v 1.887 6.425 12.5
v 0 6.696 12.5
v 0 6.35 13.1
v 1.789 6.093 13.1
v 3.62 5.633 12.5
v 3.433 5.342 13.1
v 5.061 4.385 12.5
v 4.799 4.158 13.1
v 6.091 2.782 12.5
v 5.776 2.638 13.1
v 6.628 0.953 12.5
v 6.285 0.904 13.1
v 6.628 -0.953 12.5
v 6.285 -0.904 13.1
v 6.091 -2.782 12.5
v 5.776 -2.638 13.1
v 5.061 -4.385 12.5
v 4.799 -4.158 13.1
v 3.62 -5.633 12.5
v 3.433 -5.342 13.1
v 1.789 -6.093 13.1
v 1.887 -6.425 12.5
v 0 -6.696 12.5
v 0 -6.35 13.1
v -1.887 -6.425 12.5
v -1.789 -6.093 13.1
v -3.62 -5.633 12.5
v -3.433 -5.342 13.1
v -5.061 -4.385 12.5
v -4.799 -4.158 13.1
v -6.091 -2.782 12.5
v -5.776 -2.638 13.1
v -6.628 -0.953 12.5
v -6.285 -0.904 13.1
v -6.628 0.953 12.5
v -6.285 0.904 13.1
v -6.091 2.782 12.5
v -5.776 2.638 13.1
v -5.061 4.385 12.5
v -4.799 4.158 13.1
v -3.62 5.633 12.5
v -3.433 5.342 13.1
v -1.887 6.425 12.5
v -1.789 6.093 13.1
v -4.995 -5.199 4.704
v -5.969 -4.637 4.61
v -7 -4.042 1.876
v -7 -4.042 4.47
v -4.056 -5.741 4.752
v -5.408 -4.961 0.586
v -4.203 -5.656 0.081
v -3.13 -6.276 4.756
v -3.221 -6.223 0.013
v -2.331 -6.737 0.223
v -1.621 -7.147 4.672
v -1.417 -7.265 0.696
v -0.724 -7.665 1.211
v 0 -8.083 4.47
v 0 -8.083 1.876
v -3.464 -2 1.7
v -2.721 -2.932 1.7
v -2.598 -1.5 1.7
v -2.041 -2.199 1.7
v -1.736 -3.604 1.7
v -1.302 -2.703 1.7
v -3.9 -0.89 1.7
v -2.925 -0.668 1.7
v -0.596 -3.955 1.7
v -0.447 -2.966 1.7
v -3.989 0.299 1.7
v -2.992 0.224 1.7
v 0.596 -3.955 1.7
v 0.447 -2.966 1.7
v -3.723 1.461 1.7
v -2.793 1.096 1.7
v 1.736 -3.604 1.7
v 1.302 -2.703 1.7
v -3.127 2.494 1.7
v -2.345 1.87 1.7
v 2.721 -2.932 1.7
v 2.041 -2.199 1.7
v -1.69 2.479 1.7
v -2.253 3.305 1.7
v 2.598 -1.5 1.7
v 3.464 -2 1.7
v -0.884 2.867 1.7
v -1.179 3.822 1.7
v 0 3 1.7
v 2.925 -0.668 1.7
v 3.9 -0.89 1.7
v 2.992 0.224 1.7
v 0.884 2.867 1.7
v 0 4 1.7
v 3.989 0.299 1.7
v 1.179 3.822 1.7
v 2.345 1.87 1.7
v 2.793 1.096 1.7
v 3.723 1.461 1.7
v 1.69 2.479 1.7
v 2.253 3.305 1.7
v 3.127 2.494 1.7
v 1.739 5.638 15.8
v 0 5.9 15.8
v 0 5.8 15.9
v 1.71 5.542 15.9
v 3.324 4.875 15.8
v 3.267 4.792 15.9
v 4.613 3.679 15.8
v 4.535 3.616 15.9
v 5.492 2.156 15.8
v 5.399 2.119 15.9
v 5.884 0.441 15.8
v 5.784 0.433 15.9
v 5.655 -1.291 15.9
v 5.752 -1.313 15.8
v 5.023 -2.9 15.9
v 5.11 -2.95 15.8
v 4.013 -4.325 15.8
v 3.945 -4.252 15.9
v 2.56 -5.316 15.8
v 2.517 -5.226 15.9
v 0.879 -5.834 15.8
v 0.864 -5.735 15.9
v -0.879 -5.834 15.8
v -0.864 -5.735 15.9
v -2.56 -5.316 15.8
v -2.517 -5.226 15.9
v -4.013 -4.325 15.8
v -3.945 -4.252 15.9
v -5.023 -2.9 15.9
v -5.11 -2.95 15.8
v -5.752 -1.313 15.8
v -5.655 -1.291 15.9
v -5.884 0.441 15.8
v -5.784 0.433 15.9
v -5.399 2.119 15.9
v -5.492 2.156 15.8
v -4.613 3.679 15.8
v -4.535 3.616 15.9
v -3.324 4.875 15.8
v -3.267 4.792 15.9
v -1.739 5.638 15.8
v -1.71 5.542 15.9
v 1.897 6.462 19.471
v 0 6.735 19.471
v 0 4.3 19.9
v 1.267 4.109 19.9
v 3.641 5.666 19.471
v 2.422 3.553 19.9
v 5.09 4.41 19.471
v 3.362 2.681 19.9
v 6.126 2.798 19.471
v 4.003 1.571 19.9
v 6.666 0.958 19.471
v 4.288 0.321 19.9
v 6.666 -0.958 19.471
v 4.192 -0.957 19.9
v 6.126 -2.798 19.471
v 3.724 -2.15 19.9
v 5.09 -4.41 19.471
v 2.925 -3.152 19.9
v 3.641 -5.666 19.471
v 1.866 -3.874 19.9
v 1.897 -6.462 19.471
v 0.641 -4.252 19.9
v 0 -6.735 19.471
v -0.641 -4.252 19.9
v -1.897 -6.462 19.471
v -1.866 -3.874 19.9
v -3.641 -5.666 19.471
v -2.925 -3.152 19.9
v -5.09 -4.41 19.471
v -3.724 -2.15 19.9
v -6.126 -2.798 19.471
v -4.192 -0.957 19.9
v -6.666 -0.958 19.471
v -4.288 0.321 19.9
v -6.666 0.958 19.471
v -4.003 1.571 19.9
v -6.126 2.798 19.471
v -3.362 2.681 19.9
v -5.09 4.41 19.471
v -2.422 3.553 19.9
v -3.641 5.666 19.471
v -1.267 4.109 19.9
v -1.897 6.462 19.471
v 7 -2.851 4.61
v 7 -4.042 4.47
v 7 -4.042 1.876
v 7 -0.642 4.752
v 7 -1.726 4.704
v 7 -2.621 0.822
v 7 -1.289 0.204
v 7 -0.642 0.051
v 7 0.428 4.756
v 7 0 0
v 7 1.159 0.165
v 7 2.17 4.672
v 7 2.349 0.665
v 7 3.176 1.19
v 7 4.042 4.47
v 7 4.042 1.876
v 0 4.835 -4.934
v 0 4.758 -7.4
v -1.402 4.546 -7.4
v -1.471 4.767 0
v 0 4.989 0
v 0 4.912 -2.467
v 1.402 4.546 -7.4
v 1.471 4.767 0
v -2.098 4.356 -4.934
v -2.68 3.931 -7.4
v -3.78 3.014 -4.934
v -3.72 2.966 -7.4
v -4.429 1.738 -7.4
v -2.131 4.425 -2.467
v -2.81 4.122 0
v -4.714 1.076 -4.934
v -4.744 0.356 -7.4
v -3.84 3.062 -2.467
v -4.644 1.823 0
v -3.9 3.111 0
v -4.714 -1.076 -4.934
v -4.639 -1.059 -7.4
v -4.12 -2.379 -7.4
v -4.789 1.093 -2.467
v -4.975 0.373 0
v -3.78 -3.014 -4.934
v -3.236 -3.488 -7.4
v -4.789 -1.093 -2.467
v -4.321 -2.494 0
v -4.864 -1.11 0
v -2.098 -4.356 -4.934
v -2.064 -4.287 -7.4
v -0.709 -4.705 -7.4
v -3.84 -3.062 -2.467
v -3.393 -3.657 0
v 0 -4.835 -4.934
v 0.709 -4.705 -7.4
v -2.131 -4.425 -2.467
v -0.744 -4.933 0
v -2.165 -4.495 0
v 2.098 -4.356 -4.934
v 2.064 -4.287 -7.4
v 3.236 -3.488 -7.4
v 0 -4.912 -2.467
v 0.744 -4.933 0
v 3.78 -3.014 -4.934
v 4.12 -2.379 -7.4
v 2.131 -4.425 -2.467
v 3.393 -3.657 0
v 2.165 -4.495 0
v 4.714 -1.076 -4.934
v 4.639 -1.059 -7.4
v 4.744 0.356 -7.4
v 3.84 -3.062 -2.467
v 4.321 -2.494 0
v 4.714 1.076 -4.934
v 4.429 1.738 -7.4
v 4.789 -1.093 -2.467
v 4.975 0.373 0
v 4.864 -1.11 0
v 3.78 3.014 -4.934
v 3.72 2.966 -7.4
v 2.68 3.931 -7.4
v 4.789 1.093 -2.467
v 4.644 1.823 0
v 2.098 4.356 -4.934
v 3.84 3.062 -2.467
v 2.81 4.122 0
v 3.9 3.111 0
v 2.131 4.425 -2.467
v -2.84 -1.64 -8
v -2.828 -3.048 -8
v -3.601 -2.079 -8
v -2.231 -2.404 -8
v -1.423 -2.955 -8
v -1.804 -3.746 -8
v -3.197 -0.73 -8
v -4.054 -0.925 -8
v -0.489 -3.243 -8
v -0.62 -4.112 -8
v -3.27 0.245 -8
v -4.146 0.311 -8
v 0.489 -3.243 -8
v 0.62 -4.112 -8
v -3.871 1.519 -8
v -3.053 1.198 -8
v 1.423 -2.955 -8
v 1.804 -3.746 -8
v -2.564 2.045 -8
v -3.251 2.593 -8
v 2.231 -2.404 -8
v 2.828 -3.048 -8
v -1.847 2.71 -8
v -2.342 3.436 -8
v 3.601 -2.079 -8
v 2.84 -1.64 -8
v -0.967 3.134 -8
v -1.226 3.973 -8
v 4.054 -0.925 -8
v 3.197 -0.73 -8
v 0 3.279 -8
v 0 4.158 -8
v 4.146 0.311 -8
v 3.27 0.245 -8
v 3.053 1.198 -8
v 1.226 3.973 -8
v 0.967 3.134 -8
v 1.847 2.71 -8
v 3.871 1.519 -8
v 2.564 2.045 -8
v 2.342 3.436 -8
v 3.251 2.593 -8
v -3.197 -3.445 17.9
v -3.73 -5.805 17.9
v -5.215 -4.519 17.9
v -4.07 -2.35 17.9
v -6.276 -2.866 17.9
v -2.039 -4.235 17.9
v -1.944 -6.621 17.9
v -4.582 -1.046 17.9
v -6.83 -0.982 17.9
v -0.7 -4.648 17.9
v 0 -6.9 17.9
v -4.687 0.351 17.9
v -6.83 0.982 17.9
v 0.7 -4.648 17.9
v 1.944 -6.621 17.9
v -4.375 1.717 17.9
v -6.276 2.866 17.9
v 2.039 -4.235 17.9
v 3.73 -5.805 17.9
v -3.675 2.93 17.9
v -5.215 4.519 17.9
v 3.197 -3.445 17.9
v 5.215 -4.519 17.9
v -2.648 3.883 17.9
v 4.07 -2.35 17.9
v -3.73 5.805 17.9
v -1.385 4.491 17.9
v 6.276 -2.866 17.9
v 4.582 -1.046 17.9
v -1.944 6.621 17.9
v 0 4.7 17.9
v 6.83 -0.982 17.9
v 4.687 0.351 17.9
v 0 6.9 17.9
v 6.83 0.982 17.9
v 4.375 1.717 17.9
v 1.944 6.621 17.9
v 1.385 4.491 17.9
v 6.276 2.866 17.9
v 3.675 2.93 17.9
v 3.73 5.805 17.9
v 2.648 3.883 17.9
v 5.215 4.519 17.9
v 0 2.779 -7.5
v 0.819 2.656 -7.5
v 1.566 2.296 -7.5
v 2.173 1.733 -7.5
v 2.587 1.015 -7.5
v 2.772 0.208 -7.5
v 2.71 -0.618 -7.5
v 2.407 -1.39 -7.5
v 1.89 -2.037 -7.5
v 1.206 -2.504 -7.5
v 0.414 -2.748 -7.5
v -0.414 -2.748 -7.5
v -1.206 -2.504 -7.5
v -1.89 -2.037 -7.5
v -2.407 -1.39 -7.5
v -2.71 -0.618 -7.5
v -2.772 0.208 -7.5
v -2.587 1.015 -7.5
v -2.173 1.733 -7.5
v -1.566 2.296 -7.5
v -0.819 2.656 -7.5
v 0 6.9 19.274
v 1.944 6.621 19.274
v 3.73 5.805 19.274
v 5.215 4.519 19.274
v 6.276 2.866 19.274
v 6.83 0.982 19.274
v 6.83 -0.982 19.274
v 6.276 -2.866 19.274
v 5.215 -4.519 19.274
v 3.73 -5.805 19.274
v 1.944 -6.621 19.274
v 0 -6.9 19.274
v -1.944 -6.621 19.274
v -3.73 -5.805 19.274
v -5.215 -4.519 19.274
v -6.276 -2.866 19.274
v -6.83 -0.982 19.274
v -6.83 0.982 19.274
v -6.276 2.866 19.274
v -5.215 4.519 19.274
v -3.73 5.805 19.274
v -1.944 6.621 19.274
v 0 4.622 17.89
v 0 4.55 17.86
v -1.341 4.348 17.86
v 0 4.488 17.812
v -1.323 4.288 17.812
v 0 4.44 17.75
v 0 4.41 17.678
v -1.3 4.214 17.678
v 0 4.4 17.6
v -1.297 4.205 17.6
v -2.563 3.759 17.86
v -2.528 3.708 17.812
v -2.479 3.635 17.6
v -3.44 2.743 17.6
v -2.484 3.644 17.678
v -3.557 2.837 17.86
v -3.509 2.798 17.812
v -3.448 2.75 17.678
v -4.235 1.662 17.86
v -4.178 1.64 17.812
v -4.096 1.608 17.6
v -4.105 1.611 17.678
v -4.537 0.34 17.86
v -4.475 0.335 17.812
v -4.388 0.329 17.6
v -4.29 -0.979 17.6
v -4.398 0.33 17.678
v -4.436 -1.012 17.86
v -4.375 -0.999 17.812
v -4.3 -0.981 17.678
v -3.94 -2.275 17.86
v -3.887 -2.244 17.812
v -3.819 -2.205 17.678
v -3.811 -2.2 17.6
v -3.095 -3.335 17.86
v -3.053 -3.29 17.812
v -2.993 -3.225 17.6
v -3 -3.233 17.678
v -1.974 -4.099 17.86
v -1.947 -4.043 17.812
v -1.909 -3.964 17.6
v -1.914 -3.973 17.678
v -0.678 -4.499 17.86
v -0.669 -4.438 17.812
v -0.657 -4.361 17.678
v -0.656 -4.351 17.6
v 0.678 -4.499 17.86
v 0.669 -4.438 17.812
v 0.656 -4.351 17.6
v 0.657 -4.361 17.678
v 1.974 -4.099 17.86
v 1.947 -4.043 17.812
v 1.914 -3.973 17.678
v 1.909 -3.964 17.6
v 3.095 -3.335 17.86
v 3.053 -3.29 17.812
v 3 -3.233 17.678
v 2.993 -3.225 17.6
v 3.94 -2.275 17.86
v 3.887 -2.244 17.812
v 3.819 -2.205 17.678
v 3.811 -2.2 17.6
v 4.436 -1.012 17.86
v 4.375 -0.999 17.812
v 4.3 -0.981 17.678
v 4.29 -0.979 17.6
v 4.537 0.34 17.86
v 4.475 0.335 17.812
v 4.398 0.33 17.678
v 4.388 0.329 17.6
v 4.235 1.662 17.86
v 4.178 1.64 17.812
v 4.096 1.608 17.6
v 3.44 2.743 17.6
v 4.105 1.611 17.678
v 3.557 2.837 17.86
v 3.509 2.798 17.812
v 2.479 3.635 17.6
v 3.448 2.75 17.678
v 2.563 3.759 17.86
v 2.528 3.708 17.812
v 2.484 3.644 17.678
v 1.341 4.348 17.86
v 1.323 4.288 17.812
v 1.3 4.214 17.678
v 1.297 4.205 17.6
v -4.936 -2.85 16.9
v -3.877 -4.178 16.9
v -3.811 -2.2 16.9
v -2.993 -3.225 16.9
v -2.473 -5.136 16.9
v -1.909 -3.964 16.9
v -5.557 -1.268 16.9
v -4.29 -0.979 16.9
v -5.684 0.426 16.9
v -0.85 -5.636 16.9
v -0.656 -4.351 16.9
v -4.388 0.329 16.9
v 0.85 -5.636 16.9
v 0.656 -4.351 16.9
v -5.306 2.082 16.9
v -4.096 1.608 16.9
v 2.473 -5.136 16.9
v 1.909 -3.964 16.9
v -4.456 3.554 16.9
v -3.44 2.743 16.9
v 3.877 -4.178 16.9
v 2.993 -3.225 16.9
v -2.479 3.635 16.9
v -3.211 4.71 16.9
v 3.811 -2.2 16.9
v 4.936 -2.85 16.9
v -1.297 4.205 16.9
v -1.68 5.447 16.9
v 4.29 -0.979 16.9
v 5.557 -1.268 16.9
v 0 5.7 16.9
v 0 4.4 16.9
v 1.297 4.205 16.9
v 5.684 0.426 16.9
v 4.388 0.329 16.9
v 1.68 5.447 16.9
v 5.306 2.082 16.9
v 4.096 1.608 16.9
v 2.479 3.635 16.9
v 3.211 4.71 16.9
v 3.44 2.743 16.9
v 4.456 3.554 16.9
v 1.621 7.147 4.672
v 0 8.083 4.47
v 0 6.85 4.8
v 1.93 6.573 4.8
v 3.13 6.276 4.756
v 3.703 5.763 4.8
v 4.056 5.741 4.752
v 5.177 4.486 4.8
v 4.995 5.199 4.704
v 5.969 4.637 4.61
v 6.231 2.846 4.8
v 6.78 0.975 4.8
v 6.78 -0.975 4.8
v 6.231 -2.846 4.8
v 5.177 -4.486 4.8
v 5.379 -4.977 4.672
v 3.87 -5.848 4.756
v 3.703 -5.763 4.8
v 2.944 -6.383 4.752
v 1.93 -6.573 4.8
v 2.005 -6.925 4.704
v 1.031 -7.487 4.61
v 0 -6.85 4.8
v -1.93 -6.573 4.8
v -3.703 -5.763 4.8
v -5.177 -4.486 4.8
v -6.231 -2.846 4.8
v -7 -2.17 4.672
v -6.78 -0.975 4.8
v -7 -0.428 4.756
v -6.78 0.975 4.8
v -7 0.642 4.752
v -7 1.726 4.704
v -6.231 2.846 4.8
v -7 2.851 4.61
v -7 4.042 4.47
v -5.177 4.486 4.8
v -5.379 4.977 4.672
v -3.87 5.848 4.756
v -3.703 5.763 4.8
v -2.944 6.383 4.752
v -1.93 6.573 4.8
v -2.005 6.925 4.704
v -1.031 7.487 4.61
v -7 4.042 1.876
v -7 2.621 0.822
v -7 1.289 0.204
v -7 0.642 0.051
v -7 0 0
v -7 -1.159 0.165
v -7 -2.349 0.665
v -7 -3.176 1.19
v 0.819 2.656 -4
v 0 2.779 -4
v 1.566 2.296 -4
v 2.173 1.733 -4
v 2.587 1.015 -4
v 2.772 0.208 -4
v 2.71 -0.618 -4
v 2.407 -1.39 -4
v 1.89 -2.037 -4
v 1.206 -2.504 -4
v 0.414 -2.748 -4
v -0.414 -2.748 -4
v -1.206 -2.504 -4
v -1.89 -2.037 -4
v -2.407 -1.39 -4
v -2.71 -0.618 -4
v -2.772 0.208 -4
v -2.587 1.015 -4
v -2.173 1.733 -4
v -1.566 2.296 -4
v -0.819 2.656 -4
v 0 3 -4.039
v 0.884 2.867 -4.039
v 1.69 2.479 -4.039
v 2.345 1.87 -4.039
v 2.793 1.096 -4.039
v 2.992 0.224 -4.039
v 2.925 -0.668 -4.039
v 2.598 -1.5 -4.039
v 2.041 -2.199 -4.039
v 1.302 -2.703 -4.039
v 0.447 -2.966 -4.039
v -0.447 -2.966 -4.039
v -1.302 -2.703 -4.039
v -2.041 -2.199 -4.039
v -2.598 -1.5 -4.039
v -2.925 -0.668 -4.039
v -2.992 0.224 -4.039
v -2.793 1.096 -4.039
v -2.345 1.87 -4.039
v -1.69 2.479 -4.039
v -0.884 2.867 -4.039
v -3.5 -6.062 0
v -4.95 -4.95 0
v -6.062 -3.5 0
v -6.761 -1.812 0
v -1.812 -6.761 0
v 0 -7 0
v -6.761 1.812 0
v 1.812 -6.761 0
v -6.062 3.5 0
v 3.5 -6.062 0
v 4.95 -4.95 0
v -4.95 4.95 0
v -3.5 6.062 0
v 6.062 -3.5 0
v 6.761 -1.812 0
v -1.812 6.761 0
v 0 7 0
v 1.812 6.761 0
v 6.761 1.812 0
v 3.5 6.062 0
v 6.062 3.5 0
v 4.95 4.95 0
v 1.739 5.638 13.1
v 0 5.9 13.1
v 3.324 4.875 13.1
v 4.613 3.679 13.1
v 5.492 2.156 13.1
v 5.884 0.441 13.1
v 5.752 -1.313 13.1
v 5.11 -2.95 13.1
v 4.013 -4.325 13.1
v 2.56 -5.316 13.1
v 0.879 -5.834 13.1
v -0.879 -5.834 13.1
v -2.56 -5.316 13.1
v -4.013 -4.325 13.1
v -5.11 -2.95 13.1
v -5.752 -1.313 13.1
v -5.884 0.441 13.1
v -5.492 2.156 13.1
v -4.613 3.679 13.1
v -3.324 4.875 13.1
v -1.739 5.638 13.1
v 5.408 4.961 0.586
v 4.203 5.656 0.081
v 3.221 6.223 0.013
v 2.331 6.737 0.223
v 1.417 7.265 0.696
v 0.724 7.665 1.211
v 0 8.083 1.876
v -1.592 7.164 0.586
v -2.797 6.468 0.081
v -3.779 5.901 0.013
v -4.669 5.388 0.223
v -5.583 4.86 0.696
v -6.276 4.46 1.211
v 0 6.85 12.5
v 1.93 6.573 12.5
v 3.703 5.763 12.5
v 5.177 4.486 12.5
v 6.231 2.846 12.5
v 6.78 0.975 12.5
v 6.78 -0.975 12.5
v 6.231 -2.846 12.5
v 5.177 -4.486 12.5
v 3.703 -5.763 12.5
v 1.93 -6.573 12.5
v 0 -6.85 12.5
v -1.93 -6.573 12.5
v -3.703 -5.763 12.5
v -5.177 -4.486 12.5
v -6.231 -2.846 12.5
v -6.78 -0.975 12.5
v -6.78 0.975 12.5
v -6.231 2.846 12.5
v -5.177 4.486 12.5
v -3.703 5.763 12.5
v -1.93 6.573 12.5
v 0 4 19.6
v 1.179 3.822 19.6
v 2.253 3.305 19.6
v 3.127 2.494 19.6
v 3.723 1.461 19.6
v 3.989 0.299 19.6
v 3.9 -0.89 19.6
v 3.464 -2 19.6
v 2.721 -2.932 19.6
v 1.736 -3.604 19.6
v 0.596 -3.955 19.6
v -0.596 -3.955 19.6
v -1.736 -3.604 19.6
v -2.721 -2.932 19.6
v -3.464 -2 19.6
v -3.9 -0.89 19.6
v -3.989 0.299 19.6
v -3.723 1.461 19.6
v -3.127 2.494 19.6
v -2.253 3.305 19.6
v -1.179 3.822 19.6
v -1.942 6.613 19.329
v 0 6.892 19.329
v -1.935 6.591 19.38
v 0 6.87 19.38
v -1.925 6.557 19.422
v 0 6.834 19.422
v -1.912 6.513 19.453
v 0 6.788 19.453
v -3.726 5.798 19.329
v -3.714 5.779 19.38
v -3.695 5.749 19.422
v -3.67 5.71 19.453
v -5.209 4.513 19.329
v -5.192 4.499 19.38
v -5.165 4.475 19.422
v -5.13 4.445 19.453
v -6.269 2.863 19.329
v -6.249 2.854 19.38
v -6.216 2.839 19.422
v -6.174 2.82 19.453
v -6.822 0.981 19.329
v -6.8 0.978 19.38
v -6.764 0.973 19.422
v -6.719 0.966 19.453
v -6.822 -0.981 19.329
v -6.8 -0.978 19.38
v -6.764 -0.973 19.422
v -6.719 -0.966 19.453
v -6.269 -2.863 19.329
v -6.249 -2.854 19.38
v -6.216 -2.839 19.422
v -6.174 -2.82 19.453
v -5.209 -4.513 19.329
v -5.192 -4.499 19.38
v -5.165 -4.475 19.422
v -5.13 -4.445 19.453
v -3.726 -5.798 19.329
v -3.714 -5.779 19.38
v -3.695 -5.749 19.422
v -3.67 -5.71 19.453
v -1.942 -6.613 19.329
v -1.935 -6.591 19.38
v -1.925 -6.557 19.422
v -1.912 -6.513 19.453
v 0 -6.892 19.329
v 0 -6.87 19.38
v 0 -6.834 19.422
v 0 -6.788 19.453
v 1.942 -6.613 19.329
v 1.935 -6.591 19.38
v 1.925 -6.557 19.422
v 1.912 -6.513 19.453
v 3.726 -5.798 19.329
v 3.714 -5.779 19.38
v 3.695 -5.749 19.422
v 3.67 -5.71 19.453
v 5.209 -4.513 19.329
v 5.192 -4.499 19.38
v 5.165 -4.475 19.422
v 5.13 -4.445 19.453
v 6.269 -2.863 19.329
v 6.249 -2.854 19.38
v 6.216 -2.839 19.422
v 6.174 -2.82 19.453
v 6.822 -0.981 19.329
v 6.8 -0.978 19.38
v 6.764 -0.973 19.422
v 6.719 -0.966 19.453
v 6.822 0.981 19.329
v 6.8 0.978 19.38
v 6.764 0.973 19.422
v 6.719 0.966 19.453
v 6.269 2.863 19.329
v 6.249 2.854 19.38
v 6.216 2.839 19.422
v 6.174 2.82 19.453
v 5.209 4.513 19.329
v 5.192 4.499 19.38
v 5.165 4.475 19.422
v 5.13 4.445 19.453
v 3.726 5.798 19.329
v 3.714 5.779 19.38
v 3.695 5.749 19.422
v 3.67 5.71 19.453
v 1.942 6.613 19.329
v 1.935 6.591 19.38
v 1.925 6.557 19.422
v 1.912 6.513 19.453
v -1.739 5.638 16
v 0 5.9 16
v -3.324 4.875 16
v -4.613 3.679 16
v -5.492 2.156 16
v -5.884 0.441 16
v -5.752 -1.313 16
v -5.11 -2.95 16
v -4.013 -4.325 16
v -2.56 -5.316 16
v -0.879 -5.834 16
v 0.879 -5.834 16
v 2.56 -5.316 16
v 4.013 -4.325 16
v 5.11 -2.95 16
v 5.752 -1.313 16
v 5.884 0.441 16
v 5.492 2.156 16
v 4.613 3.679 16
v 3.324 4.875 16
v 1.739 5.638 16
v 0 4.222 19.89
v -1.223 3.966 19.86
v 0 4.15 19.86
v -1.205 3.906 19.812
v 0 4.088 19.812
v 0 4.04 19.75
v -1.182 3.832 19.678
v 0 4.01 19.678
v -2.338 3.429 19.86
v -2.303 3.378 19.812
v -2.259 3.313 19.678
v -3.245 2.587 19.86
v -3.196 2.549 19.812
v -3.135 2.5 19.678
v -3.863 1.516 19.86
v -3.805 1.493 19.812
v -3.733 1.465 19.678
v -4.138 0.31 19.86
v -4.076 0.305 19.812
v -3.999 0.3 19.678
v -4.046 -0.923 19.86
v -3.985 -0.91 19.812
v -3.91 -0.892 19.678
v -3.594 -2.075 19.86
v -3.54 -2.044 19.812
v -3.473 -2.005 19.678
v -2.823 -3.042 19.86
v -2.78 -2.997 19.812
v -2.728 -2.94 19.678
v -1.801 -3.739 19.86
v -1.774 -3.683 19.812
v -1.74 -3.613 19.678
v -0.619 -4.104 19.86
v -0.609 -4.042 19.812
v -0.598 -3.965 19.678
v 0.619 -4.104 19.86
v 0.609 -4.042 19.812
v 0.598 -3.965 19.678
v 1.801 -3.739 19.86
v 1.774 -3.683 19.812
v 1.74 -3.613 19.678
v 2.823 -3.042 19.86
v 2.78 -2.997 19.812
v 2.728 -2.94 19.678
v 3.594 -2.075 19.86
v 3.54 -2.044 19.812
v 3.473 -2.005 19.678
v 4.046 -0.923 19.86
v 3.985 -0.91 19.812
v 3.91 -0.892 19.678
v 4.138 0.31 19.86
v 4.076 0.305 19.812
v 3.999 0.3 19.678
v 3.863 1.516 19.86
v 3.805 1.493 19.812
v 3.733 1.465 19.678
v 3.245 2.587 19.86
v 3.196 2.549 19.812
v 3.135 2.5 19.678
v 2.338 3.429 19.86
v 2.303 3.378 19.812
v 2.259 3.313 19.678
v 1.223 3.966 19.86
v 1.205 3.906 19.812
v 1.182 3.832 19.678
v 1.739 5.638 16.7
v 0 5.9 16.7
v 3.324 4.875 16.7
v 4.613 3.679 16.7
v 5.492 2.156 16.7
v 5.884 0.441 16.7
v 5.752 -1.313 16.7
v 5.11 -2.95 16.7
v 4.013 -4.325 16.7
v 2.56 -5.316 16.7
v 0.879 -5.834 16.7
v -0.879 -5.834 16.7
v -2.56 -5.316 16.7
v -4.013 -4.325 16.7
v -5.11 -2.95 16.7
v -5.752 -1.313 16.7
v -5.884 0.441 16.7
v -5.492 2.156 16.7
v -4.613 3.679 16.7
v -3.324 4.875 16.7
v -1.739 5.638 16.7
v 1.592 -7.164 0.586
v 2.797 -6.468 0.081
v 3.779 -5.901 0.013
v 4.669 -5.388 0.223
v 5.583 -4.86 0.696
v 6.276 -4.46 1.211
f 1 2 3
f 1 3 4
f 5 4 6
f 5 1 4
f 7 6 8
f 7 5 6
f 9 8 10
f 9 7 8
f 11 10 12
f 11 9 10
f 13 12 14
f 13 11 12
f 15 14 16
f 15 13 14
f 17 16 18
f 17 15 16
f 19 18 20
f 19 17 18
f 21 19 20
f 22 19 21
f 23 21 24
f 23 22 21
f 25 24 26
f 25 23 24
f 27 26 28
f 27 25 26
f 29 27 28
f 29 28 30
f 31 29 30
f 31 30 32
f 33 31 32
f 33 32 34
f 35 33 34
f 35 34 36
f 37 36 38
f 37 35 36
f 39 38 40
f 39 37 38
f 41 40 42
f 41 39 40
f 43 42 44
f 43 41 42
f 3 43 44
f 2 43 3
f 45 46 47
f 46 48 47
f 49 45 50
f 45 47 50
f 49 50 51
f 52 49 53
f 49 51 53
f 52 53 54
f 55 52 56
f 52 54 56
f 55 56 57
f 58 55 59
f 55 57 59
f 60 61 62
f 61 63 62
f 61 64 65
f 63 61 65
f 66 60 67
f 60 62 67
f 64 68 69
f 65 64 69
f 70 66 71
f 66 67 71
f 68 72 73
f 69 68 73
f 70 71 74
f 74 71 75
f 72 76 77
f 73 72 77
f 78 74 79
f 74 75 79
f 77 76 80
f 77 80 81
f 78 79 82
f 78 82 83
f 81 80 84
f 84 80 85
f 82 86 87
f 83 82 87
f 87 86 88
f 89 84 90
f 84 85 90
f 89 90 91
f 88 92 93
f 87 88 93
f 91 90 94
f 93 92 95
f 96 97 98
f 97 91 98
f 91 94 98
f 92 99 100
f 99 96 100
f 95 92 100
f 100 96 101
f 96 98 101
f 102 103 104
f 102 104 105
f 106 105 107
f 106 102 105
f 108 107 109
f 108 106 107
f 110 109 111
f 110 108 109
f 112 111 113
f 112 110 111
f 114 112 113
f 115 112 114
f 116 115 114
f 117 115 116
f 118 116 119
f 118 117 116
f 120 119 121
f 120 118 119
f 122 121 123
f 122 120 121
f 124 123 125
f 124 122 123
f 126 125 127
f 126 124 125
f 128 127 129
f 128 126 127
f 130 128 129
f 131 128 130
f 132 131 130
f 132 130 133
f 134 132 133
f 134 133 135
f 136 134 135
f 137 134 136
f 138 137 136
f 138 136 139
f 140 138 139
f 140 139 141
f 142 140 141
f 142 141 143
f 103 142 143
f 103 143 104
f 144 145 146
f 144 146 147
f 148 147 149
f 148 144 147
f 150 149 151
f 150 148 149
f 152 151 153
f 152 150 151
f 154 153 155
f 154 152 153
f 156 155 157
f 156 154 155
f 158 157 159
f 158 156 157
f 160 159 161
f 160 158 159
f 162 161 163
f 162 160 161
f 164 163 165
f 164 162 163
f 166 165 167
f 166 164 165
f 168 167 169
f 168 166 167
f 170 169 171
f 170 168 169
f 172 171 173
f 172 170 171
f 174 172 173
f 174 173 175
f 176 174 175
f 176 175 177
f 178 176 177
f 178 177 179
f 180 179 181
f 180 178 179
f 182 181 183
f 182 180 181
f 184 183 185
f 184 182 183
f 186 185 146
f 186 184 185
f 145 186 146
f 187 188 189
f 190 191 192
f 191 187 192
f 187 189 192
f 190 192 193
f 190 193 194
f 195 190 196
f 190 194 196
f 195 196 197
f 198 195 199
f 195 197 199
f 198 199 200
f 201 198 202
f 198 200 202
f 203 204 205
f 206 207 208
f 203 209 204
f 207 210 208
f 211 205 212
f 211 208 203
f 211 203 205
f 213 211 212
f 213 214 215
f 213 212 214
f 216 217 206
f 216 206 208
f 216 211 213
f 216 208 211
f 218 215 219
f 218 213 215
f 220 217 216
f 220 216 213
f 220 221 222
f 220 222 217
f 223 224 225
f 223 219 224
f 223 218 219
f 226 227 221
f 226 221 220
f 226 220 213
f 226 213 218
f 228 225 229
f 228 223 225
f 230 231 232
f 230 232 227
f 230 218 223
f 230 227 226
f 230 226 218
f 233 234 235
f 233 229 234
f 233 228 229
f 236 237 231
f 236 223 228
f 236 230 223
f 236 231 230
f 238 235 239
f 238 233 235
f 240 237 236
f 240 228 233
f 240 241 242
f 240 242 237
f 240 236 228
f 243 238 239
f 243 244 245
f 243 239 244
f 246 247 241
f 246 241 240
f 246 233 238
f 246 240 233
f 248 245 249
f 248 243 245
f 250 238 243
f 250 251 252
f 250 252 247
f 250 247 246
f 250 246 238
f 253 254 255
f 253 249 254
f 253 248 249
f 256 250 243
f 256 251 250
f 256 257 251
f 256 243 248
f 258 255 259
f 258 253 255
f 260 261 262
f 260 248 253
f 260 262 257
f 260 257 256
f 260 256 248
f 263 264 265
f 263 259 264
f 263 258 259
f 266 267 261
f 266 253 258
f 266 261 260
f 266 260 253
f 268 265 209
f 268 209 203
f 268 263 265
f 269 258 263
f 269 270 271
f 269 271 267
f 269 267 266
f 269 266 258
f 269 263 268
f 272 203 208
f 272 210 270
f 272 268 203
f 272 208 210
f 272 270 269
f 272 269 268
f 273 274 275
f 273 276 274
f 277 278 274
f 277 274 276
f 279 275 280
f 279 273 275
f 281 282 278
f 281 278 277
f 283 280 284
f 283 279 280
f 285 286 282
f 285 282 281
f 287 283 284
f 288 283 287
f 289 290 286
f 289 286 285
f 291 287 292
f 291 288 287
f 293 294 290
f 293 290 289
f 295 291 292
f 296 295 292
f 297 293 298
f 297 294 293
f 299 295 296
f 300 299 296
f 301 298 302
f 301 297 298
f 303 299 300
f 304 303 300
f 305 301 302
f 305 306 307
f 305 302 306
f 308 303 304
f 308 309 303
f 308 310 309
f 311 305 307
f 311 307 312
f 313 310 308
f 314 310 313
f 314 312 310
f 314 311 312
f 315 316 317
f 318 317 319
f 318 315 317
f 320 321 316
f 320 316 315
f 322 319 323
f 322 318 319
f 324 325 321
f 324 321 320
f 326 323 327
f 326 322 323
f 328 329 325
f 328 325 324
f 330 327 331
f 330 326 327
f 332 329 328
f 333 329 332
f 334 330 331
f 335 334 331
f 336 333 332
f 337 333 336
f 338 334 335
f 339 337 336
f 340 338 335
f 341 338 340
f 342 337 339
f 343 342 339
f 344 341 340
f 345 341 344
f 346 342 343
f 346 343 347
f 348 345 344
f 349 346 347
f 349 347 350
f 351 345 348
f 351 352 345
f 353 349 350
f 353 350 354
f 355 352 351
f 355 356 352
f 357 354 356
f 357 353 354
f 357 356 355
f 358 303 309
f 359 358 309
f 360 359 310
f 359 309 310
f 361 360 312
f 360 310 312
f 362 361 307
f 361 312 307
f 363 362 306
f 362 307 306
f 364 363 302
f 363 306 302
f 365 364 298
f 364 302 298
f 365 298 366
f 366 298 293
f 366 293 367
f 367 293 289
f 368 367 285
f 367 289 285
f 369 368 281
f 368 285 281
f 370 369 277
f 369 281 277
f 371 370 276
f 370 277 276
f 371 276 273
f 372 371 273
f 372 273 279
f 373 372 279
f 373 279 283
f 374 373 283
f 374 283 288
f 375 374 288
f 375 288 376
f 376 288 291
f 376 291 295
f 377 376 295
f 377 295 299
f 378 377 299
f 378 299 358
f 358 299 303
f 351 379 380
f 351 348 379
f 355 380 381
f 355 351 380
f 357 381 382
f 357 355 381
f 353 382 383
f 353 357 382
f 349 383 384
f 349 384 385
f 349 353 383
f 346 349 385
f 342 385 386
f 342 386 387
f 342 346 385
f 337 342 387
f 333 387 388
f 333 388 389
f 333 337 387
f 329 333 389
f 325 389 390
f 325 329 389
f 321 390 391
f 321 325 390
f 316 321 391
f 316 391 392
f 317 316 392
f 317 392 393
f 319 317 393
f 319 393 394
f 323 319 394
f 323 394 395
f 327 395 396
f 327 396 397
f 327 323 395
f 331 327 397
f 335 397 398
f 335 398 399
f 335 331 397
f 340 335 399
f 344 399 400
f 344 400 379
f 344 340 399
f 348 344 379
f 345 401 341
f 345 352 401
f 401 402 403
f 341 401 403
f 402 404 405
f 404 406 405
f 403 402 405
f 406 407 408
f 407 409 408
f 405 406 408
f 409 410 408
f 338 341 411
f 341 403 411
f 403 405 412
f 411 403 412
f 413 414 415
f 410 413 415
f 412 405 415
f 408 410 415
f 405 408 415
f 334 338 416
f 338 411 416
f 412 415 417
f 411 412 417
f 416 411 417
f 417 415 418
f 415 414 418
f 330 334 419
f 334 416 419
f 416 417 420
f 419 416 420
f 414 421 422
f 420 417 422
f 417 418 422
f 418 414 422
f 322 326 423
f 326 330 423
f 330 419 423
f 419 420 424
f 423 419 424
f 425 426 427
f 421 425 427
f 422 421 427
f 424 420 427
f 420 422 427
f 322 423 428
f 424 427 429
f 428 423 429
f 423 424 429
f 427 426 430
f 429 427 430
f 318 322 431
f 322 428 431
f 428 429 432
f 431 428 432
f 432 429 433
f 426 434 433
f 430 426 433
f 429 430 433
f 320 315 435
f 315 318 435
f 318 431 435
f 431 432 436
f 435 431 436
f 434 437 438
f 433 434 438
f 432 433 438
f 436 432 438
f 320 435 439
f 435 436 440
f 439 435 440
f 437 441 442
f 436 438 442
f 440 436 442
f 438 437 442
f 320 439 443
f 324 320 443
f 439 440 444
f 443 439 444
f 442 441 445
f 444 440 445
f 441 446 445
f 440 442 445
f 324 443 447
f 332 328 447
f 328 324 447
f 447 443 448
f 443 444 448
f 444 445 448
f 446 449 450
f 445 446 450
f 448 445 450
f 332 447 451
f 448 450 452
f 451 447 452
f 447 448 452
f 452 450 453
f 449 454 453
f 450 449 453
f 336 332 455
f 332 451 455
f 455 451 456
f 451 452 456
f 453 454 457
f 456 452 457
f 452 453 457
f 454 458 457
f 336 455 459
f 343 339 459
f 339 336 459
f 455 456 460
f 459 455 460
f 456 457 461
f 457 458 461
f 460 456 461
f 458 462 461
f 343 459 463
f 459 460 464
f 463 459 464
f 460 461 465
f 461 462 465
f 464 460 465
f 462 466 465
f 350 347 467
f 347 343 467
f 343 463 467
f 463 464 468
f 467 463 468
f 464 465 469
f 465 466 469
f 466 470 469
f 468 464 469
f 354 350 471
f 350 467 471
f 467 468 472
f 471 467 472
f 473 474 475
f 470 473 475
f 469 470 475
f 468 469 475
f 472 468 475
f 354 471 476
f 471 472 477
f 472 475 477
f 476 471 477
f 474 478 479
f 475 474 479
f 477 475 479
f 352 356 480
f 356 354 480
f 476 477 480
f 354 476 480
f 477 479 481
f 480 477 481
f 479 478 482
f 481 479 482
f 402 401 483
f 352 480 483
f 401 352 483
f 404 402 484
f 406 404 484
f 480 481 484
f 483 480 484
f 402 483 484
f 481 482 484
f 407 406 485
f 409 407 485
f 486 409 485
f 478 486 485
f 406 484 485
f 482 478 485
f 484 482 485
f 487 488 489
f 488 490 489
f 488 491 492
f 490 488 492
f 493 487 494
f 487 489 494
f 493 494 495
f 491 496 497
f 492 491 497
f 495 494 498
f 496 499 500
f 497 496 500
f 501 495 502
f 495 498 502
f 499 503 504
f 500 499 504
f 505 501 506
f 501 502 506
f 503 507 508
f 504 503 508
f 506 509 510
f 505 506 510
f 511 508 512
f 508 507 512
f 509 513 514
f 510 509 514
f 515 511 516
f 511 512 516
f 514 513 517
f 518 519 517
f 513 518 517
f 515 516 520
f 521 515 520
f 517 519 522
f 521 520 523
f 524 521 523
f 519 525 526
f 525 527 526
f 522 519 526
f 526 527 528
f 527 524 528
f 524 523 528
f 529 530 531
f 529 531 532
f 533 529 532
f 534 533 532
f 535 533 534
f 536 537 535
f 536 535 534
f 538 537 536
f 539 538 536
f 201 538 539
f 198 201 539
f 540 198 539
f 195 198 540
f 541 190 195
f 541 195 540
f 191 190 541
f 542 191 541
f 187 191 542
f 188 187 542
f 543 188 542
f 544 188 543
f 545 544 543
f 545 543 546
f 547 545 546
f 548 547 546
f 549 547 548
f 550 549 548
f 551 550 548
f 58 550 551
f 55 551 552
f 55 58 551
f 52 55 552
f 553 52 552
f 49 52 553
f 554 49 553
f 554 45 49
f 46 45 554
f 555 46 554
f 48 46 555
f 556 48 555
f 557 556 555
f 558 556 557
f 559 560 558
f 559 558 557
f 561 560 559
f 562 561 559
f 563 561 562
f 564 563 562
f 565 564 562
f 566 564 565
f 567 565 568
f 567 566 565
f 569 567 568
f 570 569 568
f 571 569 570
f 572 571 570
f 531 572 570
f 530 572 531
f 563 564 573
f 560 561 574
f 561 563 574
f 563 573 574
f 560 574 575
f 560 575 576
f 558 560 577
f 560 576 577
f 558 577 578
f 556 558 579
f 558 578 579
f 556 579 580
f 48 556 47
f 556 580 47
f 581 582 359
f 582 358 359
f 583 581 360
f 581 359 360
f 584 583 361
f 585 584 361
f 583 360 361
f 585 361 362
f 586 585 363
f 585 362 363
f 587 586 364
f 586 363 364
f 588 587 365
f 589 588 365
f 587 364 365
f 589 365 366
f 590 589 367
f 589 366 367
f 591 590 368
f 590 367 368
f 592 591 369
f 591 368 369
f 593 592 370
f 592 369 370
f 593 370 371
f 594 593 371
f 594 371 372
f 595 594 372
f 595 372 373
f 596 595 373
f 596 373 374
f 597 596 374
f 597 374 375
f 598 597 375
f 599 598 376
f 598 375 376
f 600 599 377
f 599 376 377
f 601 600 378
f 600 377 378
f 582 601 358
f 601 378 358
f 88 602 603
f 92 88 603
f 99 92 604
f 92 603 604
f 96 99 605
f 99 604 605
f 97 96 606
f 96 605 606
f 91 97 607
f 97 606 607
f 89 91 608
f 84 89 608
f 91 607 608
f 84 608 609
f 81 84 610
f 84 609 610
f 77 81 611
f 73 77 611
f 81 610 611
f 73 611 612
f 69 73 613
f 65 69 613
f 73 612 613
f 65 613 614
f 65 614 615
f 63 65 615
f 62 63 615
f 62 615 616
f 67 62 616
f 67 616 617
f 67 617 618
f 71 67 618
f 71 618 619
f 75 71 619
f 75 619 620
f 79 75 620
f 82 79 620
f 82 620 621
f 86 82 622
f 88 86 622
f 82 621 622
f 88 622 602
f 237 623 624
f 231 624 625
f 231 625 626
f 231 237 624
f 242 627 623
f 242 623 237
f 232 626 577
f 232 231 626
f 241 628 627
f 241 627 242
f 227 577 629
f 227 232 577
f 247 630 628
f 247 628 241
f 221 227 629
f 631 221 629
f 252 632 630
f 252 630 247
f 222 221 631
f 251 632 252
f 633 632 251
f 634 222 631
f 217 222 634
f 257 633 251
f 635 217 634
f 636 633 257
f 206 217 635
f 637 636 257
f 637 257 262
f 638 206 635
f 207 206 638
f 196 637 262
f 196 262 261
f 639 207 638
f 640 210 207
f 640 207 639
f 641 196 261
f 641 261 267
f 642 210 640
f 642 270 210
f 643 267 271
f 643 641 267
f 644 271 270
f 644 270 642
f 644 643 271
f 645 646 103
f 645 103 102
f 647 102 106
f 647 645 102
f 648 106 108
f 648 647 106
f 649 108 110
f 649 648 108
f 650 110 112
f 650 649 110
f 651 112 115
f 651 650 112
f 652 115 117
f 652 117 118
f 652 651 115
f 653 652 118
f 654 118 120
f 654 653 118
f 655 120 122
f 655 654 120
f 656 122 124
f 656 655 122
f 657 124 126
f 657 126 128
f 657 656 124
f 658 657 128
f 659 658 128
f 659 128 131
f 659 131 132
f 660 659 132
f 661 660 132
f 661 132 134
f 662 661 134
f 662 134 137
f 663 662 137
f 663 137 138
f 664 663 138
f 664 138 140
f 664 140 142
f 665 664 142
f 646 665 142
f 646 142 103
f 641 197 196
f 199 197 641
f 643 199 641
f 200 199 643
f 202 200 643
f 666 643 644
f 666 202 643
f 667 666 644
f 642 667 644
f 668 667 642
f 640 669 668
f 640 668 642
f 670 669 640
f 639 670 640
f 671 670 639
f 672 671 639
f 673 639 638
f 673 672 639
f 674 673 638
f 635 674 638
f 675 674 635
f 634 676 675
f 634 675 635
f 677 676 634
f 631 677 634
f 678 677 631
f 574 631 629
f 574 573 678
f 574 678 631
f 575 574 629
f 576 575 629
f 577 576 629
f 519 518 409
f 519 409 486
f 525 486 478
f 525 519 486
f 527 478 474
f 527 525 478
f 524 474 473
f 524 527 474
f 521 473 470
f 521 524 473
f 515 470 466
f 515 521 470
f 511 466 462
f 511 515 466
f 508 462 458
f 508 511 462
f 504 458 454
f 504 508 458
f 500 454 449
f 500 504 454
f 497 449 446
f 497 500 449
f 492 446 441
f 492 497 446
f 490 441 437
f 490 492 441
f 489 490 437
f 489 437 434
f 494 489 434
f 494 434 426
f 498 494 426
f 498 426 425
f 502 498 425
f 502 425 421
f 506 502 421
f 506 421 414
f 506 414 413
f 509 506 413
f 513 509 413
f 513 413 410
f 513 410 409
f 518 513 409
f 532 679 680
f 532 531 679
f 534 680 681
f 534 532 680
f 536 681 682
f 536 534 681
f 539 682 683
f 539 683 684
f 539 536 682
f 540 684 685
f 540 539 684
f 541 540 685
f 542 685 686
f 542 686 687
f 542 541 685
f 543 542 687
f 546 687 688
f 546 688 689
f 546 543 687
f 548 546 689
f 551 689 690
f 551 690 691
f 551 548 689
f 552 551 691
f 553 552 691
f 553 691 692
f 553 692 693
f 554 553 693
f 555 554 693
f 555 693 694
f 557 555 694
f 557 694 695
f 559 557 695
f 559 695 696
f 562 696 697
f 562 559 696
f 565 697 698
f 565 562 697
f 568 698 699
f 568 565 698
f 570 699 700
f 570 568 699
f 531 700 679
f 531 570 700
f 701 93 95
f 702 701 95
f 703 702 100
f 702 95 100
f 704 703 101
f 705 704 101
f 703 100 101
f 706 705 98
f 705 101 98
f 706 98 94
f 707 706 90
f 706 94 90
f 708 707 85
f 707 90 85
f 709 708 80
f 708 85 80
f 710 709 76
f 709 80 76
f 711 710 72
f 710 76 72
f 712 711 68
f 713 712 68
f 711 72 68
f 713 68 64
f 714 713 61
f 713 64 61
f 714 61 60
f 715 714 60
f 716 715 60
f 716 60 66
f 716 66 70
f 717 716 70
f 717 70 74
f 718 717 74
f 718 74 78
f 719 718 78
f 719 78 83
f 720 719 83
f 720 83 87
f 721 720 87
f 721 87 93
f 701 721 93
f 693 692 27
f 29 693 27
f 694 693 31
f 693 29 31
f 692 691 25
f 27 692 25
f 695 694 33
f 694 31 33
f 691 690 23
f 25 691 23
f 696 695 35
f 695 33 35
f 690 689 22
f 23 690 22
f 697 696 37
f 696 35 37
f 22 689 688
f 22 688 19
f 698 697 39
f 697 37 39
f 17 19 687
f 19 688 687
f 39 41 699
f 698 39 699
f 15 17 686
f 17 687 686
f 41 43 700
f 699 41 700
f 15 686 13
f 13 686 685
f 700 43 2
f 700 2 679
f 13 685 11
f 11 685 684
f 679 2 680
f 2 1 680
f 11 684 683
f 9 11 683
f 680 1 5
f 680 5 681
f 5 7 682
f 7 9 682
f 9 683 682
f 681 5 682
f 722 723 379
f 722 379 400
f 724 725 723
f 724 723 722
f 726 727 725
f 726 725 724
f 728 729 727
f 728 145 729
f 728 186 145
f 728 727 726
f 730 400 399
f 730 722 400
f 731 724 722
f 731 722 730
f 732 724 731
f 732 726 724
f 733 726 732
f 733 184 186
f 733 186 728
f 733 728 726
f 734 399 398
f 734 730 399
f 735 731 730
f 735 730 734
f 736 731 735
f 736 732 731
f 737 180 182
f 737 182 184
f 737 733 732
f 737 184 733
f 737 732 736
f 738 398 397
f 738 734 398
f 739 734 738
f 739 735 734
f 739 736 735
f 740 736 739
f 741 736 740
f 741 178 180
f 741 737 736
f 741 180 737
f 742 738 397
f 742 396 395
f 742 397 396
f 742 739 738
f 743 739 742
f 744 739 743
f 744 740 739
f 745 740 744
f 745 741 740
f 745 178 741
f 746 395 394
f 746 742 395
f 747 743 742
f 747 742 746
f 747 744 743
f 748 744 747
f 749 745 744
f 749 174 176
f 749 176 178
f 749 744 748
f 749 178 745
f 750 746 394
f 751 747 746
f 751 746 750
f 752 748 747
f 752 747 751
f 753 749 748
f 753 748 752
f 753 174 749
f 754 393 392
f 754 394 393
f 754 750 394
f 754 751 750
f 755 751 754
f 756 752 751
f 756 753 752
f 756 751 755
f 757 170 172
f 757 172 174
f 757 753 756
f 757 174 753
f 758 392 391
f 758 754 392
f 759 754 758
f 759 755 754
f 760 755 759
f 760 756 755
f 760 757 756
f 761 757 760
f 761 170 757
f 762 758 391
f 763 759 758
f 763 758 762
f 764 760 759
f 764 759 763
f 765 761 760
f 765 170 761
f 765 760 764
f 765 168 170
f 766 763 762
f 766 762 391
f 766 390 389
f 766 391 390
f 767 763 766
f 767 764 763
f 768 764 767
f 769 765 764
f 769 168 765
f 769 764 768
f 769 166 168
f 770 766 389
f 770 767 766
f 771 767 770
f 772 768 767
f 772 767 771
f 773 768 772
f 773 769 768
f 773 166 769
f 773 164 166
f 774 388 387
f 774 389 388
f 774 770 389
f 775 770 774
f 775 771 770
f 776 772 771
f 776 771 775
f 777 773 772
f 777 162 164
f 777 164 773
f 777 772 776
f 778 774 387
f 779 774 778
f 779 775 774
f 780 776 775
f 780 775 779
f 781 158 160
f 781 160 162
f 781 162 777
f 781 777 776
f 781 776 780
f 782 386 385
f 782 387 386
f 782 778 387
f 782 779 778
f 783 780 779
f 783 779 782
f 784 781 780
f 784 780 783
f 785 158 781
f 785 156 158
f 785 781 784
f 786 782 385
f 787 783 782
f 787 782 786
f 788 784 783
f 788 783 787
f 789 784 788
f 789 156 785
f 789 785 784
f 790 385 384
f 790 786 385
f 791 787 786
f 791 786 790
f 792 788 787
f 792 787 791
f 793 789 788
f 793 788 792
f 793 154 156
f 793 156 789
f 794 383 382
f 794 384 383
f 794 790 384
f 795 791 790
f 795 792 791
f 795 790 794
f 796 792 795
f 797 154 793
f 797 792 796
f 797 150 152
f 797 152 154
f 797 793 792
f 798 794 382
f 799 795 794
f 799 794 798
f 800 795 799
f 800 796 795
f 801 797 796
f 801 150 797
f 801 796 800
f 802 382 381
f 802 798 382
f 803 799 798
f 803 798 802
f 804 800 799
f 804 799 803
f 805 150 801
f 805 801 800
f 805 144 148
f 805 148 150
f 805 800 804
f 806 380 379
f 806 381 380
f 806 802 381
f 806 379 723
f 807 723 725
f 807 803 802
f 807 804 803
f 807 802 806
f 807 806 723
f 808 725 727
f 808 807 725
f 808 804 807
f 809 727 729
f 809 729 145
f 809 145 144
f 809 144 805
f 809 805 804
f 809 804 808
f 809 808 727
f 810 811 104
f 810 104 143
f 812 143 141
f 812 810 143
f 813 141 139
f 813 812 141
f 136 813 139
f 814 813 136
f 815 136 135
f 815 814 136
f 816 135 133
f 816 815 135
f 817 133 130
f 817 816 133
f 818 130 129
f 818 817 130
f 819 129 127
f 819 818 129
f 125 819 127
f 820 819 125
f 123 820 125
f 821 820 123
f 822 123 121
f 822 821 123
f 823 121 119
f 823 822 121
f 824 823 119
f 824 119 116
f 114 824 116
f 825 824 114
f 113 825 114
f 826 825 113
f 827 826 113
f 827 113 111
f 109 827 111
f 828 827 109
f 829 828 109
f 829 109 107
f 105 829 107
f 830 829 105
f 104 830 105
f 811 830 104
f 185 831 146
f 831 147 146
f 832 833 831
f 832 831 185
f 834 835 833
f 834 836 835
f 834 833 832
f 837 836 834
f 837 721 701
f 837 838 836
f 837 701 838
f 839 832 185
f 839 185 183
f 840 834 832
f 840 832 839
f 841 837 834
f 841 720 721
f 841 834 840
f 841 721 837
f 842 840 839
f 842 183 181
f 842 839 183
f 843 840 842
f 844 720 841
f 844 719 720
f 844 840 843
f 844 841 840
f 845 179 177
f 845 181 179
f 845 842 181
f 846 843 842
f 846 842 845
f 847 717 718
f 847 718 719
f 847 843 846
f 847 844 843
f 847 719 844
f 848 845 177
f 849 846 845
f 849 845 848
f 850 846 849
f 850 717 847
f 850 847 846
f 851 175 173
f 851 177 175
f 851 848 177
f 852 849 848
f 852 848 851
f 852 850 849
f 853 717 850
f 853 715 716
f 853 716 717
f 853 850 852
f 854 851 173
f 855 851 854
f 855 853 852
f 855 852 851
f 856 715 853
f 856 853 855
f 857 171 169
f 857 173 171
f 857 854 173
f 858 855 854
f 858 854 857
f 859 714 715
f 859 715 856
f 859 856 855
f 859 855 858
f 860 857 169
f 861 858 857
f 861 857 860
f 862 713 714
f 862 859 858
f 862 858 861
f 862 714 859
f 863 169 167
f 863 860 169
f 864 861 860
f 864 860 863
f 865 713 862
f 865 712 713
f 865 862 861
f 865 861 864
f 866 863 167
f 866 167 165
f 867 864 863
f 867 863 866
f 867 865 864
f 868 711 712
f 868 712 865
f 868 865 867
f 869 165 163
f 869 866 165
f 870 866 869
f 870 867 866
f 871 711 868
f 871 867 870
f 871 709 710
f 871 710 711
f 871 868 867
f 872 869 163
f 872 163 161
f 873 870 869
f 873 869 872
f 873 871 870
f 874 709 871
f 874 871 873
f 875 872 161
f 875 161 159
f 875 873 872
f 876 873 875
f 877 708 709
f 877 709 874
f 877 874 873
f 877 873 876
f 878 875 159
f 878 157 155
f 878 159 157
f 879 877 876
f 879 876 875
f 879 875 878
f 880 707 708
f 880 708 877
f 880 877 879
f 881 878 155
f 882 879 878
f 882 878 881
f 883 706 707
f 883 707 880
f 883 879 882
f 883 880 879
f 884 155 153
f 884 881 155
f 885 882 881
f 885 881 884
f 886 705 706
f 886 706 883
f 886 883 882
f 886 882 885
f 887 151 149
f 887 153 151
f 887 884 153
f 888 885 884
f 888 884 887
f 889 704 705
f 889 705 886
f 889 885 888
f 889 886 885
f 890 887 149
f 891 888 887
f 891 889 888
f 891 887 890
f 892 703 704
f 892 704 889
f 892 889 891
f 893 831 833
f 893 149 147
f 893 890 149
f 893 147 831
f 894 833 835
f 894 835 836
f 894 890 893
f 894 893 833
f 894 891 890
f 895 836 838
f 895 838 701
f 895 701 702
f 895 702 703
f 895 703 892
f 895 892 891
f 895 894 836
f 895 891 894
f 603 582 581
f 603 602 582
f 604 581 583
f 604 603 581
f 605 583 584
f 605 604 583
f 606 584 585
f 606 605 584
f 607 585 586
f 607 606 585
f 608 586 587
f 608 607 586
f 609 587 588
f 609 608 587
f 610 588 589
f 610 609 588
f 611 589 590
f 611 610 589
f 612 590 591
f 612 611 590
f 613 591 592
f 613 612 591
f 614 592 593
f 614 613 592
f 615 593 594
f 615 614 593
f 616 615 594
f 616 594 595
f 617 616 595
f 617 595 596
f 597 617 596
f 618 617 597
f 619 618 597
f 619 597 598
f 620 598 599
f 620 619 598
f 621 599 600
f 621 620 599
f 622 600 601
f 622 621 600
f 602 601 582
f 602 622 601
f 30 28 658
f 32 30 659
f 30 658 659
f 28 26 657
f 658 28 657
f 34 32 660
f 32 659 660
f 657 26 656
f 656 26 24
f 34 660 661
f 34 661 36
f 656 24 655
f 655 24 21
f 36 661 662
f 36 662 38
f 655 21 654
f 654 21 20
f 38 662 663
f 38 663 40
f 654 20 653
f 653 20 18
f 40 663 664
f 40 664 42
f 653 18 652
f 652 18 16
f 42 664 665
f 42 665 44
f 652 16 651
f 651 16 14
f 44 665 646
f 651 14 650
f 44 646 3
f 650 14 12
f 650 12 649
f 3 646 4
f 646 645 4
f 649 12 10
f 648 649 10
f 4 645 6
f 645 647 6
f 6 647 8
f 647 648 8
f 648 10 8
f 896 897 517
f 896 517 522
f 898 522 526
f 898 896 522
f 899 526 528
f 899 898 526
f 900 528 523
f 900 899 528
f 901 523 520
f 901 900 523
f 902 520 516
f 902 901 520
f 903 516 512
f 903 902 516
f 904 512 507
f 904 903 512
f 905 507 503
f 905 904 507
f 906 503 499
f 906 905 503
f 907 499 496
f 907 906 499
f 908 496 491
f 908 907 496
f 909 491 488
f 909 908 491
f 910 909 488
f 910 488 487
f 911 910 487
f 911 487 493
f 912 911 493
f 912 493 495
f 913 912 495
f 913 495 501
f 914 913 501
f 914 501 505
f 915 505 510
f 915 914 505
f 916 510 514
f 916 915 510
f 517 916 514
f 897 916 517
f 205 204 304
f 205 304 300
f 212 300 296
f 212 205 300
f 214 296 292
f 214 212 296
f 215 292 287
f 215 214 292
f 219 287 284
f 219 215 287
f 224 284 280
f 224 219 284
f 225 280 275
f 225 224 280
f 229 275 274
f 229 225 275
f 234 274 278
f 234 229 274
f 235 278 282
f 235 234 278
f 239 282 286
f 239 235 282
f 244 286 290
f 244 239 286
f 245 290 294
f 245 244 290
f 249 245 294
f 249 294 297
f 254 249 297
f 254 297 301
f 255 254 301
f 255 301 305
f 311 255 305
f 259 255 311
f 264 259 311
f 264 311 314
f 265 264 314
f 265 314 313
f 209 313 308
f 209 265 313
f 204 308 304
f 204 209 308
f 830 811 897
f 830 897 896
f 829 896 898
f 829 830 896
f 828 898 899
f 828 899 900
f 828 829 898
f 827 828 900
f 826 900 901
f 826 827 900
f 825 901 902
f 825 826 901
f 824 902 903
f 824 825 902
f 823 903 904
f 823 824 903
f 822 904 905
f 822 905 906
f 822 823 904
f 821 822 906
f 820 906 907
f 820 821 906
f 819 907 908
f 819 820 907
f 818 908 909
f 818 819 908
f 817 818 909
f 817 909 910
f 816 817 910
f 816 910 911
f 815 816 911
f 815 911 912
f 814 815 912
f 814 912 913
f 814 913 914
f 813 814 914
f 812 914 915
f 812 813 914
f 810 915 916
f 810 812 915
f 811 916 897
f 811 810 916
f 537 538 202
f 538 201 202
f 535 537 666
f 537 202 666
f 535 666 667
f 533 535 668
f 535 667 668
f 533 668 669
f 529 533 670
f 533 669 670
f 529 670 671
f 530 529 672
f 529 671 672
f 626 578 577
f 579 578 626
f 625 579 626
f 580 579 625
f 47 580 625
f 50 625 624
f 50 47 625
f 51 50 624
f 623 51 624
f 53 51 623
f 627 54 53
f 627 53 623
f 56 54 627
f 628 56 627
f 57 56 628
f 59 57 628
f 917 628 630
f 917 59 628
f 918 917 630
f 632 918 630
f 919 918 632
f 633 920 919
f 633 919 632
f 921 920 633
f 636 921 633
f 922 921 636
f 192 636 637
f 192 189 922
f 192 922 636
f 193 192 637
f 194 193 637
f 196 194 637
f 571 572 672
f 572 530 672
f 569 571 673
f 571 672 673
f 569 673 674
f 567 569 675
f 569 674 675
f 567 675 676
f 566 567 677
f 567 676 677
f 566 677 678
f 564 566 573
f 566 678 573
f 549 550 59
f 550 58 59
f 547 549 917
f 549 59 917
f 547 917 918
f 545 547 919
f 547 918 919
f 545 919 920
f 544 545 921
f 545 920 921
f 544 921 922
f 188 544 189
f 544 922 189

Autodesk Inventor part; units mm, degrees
sketch "Sketch_2" plane through (0, 0, 0) normal (1, 0, 0) x (0, 1, 0)
  line L0 (0, 0) -> (0, 19.9)
  line L1 (0, 19.9) -> (4.3, 19.9)
  line L2 (4.3, 19.9) -> (6.7347, 19.4707)
  arc A0 (6.9, 19.2737) -> (6.7347, 19.4707) centre (6.7, 19.2737) ccw
  line L3 (6.9, 19.2737) -> (6.9, 17.9)
  line L4 (6.9, 17.9) -> (4.7, 17.9)
  arc A1 (4.7, 17.9) -> (4.4, 17.6) centre (4.7, 17.6) ccw
  line L5 (4.4, 17.6) -> (4.4, 16.9)
  line L6 (4.4, 16.9) -> (5.7, 16.9)
  line L7 (5.7, 16.9) -> (5.9, 16.7)
  line L8 (5.9, 16.7) -> (5.9, 16)
  line L9 (5.9, 16) -> (5.8, 15.9)
  line L10 (5.8, 15.9) -> (5.9, 15.8)
  line L11 (5.9, 15.8) -> (5.9, 13.1)
  line L12 (5.9, 13.1) -> (8.4, 13.1)
  line L13 (8.4, 13.1) -> (8.4, 2.4249)
  line L14 (8.4, 2.4249) -> (7, 0)
  line L15 (7, 0) -> (0, 0)
  line L16 (0, 0) -> (0, 19.9)
revolve "Revolution1" add sketch "Sketch_2" angle 360 about axis through (0, 0, 0) along (0, 0, -1)
sketch "Sketch_3" plane through (0, 0, 0) normal (0, 0, 1) x (1, 0, 0)
  line L0 (-14, -14) -> (14, -14)
  line L1 (14, -14) -> (14, 14)
  line L2 (14, 14) -> (-14, 14)
  line L3 (-14, 14) -> (-14, -14)
  line L4 (-7, -4.0415) -> (0, -8.0829)
  line L5 (0, -8.0829) -> (7, -4.0415)
  line L6 (7, -4.0415) -> (7, 4.0415)
  line L7 (7, 4.0415) -> (0, 8.0829)
  line L8 (0, 8.0829) -> (-7, 4.0415)
  line L9 (-7, 4.0415) -> (-7, -4.0415)
extrude "Extrusion1" cut sketch "Sketch_3" along normal blind 13.2
sketch "Sketch_4" plane through (0, 0, 0) normal (1, 0, 0) x (0, 1, 0)
  line L0 (0, -50) -> (0, 50)
  line L1 (6.35, 13.1) -> (6.6964, 12.5)
  line L2 (6.6964, 12.5) -> (6.85, 12.5)
  line L3 (6.85, 12.5) -> (6.85, 4.8)
  line L4 (6.85, 4.8) -> (16.85, 2.1205)
  line L5 (16.85, 2.1205) -> (16.85, 13.1)
  line L6 (16.85, 13.1) -> (6.35, 13.1)
revolve "Revolution2" cut sketch "Sketch_4" angle 360 about axis through (0, 0, -50) along (0, 0, -1)
sketch "Sketch_6" plane through (0, 0, 0) normal (1, 0, 0) x (0, 1, 0)
  line L0 (0, -8) -> (0, 0)
  line L1 (0, 0) -> (4.9889, 0)
  line L2 (4.9889, 0) -> (4.7578, -7.4003)
  line L3 (4.7578, -7.4003) -> (4.1581, -8)
  line L4 (4.1581, -8) -> (0, -8)
  line L5 (0, -8) -> (0, 0)
revolve "Revolution3" add sketch "Sketch_6" angle 360 about axis through (0, 0, -8) along (0, 0, -1)
thread "Thread1" size "R 1/8" standard "ISO Taper" length 6.4034
sketch "Sketch_5" plane through (0, 0, 0) normal (1, 0, 0) x (0, 1, 0)
  line L0 (0, -8) -> (0, 19.9)
  line L1 (0, 19.9) -> (4.3, 19.9)
  arc A0 (4.3, 19.9) -> (4, 19.6) centre (4.3, 19.6) ccw
  line L2 (4, 19.6) -> (4, 1.7)
  line L3 (4, 1.7) -> (3, 1.7)
  line L4 (3, 1.7) -> (3, -4.0389)
  line L5 (3, -4.0389) -> (2.7794, -4)
  line L6 (2.7794, -4) -> (2.7794, -7.5)
  line L7 (2.7794, -7.5) -> (3.2794, -8)
  line L8 (3.2794, -8) -> (0, -8)
  line L9 (0, -8) -> (0, 19.9)
revolve "Revolution4" cut sketch "Sketch_5" angle 360 about axis through (0, 0, -8) along (0, 0, -1)
ref_plane "ANBAU_XY" through (0, 0, -4) normal (0, 0, 1) x (1, 0, 0)
ref_plane "ANBAU_YZ" through (0, 0, -4) normal (1, 0, 0) x (0, 1, 0)
ref_plane "ANBAU_ZX" through (0, 0, -4) normal (0, 1, 0) x (0, 0, 1)
ref_plane "ANBAU_FDT3D_XY" through (0, 0, -4) normal (0, 0, -1) x (1, 0, 0)
ref_plane "ANBAU_FDT3D_YZ" through (0, 0, -4) normal (1, 0, 0) x (0, -1, 0)
ref_plane "ANBAU_FDT3D_ZX" through (0, 0, -4) normal (0, -1, 0) x (0, 0, -1)
ref_plane "ANBAU_STD_XY" through (0, 0, -4) normal (0, 0, 1) x (1, 0, 0)
ref_plane "ANBAU_STD_YZ" through (0, 0, -4) normal (1, 0, 0) x (0, 1, 0)
ref_plane "ANBAU_STD_ZX" through (0, 0, -4) normal (0, 1, 0) x (0, 0, 1)
ref_plane "DROSSEL_XY" through (0, 0, -4) normal (0, 0, -1) x (1, 0, 0)
ref_plane "DROSSEL_YZ" through (0, 0, -4) normal (1, 0, 0) x (0, -1, 0)
ref_plane "DROSSEL_ZX" through (0, 0, -4) normal (0, -1, 0) x (0, 0, -1)
ref_plane "FDT_SCHLAUCH_XY" through (0, 0, 1.7) normal (0, 0, 1) x (1, 0, 0)
ref_plane "FDT_SCHLAUCH_YZ" through (0, 0, 1.7) normal (1, 0, 0) x (0, 1, 0)
ref_plane "FDT_SCHLAUCH_ZX" through (0, 0, 1.7) normal (0, 1, 0) x (0, 0, 1)
ref_plane "TO_CAP_XY" through (0, 0, 19.9) normal (0, 0, 1) x (1, 0, 0)
ref_plane "TO_CAP_YZ" through (0, 0, 19.9) normal (1, 0, 0) x (0, 1, 0)
ref_plane "TO_CAP_ZX" through (0, 0, 19.9) normal (0, 1, 0) x (0, 0, 1)
properties part number "153004 QS-1/8-8"
